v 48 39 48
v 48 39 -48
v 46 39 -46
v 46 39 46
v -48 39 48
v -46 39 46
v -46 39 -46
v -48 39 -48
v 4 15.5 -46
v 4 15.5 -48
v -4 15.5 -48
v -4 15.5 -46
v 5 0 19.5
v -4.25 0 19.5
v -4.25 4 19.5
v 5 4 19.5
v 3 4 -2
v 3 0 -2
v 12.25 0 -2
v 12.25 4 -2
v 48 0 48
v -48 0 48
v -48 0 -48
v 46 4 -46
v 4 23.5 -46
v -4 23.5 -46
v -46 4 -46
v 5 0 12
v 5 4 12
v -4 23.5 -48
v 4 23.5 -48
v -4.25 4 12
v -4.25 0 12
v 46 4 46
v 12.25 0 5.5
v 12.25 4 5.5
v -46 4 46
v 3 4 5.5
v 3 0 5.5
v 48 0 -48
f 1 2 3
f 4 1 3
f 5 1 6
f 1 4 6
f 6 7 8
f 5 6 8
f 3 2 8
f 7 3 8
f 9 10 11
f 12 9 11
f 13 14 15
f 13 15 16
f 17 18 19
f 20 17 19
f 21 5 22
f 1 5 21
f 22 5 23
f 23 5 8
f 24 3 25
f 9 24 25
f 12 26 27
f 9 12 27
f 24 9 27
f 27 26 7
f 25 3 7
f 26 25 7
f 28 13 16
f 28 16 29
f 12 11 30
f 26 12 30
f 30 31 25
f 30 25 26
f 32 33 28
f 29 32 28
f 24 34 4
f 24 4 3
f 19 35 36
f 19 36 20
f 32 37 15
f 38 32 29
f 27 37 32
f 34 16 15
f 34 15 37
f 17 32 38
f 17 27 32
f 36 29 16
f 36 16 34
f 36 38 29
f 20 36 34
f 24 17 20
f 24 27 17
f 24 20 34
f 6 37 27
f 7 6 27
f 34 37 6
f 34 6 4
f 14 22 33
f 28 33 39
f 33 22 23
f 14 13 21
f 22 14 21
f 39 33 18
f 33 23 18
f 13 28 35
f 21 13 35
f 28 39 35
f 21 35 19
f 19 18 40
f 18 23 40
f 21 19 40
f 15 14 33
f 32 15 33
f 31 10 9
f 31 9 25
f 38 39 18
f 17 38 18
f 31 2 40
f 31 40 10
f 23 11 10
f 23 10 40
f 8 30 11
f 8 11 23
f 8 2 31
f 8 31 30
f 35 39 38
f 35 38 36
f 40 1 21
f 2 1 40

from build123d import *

# Parameters (mm, degrees)
SKETCH1_W               = 100
SKETCH1_H               = 100
BOSS_EXTRUDE1_DEPTH     = 4
SKETCH2_W               = 100
SKETCH2_H               = 100
SKETCH2_W_2             = 92
SKETCH2_H_2             = 92
BOSS_EXTRUDE2_DEPTH     = 35
SKETCH3_W               = 4
SKETCH3_H               = 4
CUT_EXTRUDE1_DEPTH      = 4
BOSS_EXTRUDE3_DEPTH     = 2.5
SKETCH5_W               = 5.75
SKETCH5_H               = 4
CUT_EXTRUDE2_DEPTH      = 4
CUT_EXTRUDE3_DEPTH      = 79.89866919
CUT_EXTRUDE3_DEPTH_BACK = 79.89866919
SKETCH7_W               = 9.25
SKETCH7_H               = 7.5
SKETCH8_W               = 6.199178059
SKETCH8_H               = 6.70376232
SKETCH8_W_2             = 7.56876391
SKETCH8_H_2             = 7.20834658
CUT_EXTRUDE5_DEPTH      = 10
SKETCH9_W               = 12
SKETCH9_H               = 8
CUT_EXTRUDE6_DEPTH      = 10
SKETCH10_W              = 4
SKETCH10_H              = 4
BOSS_EXTRUDE4_DEPTH     = 4
SKETCH11_OUTSIDE_W      = 131.34
SKETCH11_OUTSIDE_H      = 131.34
SKETCH11_OUTSIDE_W_2    = 96
SKETCH11_OUTSIDE_H_2    = 96
CUT_EXTRUDE7_DEPTH      = 81.752708933
SKETCH12_W              = 2
SKETCH12_H              = 8
BOSS_EXTRUDE5_DEPTH     = 2


with BuildPart() as part:
    # Sketch1 → Boss-Extrude1 (new body)
    with BuildSketch(Plane(origin=(0, 0, 0), x_dir=(1, 0, 0), z_dir=(0, 1, 0))):
        Rectangle(SKETCH1_W, SKETCH1_H)
    extrude(amount=BOSS_EXTRUDE1_DEPTH)

    # Sketch2 → Boss-Extrude2 (add)
    with BuildSketch(Plane(origin=(0, 4, 0), x_dir=(1, 0, 0), z_dir=(0, 1, 0))):
        Rectangle(SKETCH2_W, SKETCH2_H)
        Rectangle(SKETCH2_W_2, SKETCH2_H_2, mode=Mode.SUBTRACT)
    extrude(amount=BOSS_EXTRUDE2_DEPTH)

    # Sketch3 → Cut-Extrude1 (cut)
    with BuildSketch(Plane(origin=(0, 0, -50), x_dir=(-1, 0, 0), z_dir=(0, 0, -1))):
        with Locations((0, 37)):
            Rectangle(SKETCH3_W, SKETCH3_H)
    extrude(amount=-CUT_EXTRUDE1_DEPTH, mode=Mode.SUBTRACT)

    # Sketch4 → Boss-Extrude3 (add)
    with BuildSketch(Plane(origin=(0, 4, 0), x_dir=(1, 0, 0), z_dir=(0, 1, 0))):
        Polygon((-1.75, -0.5), (0.75, -0.5), (0.75, 2), (-4.25, 2), (-4.25, -3), (-1.75, -3), align=None)
        Polygon((7.25, -0.5), (9.75, -0.5), (9.75, -3), (12.25, -3), (12.25, 2), (7.25, 2), align=None)
        Polygon((12.25, -14.5), (9.75, -14.5), (9.75, -17), (7.25, -17), (7.25, -19.5), (12.25, -19.5), align=None)
        Polygon((-1.75, -17), (-1.75, -14.5), (-4.25, -14.5), (-4.25, -19.5), (0.75, -19.5), (0.75, -17), align=None)
    extrude(amount=BOSS_EXTRUDE3_DEPTH)

    # Sketch5 → Cut-Extrude2 (cut)
    with BuildSketch(Plane(origin=(0, 4, 0), x_dir=(1, 0, 0), z_dir=(0, 1, 0))):
        with Locations((1.125, -15)):
            Rectangle(SKETCH5_W, SKETCH5_H)
    extrude(amount=-CUT_EXTRUDE2_DEPTH, mode=Mode.SUBTRACT)

    # Sketch7 → Cut-Extrude3 (cut, two sides: drawn at the far end of the back side and taken through both)
    with BuildSketch(Plane(origin=(0, 4, 0), x_dir=(1, 0, 0), z_dir=(0, 1, 0)).offset(-CUT_EXTRUDE3_DEPTH_BACK)):
        with Locations((0.375, -15.75)):
            Rectangle(SKETCH7_W, SKETCH7_H)
        with Locations((7.625, -1.75)):
            Rectangle(SKETCH7_W, SKETCH7_H)
    extrude(amount=CUT_EXTRUDE3_DEPTH + CUT_EXTRUDE3_DEPTH_BACK, mode=Mode.SUBTRACT)

    # Sketch8 → Cut-Extrude5 (cut)
    with BuildSketch(Plane(origin=(0, 4, 0), x_dir=(1, 0, 0), z_dir=(0, 1, 0))):
        with Locations((-1.640574957, -0.408162103)):
            Rectangle(SKETCH8_W, SKETCH8_H)
        with Locations((10.072988236, -16.951317505)):
            Rectangle(SKETCH8_W_2, SKETCH8_H_2)
    extrude(amount=CUT_EXTRUDE5_DEPTH, mode=Mode.SUBTRACT)

    # Sketch9 → Cut-Extrude6 (cut)
    with BuildSketch(Plane(origin=(0, 0, -50), x_dir=(-1, 0, 0), z_dir=(0, 0, -1))):
        with Locations((0, 19.5)):
            Rectangle(SKETCH9_W, SKETCH9_H)
    extrude(amount=-CUT_EXTRUDE6_DEPTH, mode=Mode.SUBTRACT)

    # Sketch10 → Boss-Extrude4 (add)
    with BuildSketch(Plane(origin=(0, 0, -50), x_dir=(-1, 0, 0), z_dir=(0, 0, -1))):
        with Locations((0, 37)):
            Rectangle(SKETCH10_W, SKETCH10_H)
    extrude(amount=-BOSS_EXTRUDE4_DEPTH)

    # Sketch11 outside → Cut-Extrude7 (cut, through all)
    with BuildSketch(Plane(origin=(0, 39, 0), x_dir=(1, 0, 0), z_dir=(0, 1, 0))):
        Rectangle(SKETCH11_OUTSIDE_W, SKETCH11_OUTSIDE_H)
        Rectangle(SKETCH11_OUTSIDE_W_2, SKETCH11_OUTSIDE_H_2, mode=Mode.SUBTRACT)
    extrude(amount=-CUT_EXTRUDE7_DEPTH, mode=Mode.SUBTRACT)

    # Sketch12 → Boss-Extrude5 (add)
    with BuildSketch(Plane(origin=(0, 0, -48), x_dir=(-1, 0, 0), z_dir=(0, 0, -1))):
        with Locations((-5, 19.5)):
            Rectangle(SKETCH12_W, SKETCH12_H)
        with Locations((5, 19.5)):
            Rectangle(SKETCH12_W, SKETCH12_H)
    extrude(amount=-BOSS_EXTRUDE5_DEPTH)


solid = part.part
